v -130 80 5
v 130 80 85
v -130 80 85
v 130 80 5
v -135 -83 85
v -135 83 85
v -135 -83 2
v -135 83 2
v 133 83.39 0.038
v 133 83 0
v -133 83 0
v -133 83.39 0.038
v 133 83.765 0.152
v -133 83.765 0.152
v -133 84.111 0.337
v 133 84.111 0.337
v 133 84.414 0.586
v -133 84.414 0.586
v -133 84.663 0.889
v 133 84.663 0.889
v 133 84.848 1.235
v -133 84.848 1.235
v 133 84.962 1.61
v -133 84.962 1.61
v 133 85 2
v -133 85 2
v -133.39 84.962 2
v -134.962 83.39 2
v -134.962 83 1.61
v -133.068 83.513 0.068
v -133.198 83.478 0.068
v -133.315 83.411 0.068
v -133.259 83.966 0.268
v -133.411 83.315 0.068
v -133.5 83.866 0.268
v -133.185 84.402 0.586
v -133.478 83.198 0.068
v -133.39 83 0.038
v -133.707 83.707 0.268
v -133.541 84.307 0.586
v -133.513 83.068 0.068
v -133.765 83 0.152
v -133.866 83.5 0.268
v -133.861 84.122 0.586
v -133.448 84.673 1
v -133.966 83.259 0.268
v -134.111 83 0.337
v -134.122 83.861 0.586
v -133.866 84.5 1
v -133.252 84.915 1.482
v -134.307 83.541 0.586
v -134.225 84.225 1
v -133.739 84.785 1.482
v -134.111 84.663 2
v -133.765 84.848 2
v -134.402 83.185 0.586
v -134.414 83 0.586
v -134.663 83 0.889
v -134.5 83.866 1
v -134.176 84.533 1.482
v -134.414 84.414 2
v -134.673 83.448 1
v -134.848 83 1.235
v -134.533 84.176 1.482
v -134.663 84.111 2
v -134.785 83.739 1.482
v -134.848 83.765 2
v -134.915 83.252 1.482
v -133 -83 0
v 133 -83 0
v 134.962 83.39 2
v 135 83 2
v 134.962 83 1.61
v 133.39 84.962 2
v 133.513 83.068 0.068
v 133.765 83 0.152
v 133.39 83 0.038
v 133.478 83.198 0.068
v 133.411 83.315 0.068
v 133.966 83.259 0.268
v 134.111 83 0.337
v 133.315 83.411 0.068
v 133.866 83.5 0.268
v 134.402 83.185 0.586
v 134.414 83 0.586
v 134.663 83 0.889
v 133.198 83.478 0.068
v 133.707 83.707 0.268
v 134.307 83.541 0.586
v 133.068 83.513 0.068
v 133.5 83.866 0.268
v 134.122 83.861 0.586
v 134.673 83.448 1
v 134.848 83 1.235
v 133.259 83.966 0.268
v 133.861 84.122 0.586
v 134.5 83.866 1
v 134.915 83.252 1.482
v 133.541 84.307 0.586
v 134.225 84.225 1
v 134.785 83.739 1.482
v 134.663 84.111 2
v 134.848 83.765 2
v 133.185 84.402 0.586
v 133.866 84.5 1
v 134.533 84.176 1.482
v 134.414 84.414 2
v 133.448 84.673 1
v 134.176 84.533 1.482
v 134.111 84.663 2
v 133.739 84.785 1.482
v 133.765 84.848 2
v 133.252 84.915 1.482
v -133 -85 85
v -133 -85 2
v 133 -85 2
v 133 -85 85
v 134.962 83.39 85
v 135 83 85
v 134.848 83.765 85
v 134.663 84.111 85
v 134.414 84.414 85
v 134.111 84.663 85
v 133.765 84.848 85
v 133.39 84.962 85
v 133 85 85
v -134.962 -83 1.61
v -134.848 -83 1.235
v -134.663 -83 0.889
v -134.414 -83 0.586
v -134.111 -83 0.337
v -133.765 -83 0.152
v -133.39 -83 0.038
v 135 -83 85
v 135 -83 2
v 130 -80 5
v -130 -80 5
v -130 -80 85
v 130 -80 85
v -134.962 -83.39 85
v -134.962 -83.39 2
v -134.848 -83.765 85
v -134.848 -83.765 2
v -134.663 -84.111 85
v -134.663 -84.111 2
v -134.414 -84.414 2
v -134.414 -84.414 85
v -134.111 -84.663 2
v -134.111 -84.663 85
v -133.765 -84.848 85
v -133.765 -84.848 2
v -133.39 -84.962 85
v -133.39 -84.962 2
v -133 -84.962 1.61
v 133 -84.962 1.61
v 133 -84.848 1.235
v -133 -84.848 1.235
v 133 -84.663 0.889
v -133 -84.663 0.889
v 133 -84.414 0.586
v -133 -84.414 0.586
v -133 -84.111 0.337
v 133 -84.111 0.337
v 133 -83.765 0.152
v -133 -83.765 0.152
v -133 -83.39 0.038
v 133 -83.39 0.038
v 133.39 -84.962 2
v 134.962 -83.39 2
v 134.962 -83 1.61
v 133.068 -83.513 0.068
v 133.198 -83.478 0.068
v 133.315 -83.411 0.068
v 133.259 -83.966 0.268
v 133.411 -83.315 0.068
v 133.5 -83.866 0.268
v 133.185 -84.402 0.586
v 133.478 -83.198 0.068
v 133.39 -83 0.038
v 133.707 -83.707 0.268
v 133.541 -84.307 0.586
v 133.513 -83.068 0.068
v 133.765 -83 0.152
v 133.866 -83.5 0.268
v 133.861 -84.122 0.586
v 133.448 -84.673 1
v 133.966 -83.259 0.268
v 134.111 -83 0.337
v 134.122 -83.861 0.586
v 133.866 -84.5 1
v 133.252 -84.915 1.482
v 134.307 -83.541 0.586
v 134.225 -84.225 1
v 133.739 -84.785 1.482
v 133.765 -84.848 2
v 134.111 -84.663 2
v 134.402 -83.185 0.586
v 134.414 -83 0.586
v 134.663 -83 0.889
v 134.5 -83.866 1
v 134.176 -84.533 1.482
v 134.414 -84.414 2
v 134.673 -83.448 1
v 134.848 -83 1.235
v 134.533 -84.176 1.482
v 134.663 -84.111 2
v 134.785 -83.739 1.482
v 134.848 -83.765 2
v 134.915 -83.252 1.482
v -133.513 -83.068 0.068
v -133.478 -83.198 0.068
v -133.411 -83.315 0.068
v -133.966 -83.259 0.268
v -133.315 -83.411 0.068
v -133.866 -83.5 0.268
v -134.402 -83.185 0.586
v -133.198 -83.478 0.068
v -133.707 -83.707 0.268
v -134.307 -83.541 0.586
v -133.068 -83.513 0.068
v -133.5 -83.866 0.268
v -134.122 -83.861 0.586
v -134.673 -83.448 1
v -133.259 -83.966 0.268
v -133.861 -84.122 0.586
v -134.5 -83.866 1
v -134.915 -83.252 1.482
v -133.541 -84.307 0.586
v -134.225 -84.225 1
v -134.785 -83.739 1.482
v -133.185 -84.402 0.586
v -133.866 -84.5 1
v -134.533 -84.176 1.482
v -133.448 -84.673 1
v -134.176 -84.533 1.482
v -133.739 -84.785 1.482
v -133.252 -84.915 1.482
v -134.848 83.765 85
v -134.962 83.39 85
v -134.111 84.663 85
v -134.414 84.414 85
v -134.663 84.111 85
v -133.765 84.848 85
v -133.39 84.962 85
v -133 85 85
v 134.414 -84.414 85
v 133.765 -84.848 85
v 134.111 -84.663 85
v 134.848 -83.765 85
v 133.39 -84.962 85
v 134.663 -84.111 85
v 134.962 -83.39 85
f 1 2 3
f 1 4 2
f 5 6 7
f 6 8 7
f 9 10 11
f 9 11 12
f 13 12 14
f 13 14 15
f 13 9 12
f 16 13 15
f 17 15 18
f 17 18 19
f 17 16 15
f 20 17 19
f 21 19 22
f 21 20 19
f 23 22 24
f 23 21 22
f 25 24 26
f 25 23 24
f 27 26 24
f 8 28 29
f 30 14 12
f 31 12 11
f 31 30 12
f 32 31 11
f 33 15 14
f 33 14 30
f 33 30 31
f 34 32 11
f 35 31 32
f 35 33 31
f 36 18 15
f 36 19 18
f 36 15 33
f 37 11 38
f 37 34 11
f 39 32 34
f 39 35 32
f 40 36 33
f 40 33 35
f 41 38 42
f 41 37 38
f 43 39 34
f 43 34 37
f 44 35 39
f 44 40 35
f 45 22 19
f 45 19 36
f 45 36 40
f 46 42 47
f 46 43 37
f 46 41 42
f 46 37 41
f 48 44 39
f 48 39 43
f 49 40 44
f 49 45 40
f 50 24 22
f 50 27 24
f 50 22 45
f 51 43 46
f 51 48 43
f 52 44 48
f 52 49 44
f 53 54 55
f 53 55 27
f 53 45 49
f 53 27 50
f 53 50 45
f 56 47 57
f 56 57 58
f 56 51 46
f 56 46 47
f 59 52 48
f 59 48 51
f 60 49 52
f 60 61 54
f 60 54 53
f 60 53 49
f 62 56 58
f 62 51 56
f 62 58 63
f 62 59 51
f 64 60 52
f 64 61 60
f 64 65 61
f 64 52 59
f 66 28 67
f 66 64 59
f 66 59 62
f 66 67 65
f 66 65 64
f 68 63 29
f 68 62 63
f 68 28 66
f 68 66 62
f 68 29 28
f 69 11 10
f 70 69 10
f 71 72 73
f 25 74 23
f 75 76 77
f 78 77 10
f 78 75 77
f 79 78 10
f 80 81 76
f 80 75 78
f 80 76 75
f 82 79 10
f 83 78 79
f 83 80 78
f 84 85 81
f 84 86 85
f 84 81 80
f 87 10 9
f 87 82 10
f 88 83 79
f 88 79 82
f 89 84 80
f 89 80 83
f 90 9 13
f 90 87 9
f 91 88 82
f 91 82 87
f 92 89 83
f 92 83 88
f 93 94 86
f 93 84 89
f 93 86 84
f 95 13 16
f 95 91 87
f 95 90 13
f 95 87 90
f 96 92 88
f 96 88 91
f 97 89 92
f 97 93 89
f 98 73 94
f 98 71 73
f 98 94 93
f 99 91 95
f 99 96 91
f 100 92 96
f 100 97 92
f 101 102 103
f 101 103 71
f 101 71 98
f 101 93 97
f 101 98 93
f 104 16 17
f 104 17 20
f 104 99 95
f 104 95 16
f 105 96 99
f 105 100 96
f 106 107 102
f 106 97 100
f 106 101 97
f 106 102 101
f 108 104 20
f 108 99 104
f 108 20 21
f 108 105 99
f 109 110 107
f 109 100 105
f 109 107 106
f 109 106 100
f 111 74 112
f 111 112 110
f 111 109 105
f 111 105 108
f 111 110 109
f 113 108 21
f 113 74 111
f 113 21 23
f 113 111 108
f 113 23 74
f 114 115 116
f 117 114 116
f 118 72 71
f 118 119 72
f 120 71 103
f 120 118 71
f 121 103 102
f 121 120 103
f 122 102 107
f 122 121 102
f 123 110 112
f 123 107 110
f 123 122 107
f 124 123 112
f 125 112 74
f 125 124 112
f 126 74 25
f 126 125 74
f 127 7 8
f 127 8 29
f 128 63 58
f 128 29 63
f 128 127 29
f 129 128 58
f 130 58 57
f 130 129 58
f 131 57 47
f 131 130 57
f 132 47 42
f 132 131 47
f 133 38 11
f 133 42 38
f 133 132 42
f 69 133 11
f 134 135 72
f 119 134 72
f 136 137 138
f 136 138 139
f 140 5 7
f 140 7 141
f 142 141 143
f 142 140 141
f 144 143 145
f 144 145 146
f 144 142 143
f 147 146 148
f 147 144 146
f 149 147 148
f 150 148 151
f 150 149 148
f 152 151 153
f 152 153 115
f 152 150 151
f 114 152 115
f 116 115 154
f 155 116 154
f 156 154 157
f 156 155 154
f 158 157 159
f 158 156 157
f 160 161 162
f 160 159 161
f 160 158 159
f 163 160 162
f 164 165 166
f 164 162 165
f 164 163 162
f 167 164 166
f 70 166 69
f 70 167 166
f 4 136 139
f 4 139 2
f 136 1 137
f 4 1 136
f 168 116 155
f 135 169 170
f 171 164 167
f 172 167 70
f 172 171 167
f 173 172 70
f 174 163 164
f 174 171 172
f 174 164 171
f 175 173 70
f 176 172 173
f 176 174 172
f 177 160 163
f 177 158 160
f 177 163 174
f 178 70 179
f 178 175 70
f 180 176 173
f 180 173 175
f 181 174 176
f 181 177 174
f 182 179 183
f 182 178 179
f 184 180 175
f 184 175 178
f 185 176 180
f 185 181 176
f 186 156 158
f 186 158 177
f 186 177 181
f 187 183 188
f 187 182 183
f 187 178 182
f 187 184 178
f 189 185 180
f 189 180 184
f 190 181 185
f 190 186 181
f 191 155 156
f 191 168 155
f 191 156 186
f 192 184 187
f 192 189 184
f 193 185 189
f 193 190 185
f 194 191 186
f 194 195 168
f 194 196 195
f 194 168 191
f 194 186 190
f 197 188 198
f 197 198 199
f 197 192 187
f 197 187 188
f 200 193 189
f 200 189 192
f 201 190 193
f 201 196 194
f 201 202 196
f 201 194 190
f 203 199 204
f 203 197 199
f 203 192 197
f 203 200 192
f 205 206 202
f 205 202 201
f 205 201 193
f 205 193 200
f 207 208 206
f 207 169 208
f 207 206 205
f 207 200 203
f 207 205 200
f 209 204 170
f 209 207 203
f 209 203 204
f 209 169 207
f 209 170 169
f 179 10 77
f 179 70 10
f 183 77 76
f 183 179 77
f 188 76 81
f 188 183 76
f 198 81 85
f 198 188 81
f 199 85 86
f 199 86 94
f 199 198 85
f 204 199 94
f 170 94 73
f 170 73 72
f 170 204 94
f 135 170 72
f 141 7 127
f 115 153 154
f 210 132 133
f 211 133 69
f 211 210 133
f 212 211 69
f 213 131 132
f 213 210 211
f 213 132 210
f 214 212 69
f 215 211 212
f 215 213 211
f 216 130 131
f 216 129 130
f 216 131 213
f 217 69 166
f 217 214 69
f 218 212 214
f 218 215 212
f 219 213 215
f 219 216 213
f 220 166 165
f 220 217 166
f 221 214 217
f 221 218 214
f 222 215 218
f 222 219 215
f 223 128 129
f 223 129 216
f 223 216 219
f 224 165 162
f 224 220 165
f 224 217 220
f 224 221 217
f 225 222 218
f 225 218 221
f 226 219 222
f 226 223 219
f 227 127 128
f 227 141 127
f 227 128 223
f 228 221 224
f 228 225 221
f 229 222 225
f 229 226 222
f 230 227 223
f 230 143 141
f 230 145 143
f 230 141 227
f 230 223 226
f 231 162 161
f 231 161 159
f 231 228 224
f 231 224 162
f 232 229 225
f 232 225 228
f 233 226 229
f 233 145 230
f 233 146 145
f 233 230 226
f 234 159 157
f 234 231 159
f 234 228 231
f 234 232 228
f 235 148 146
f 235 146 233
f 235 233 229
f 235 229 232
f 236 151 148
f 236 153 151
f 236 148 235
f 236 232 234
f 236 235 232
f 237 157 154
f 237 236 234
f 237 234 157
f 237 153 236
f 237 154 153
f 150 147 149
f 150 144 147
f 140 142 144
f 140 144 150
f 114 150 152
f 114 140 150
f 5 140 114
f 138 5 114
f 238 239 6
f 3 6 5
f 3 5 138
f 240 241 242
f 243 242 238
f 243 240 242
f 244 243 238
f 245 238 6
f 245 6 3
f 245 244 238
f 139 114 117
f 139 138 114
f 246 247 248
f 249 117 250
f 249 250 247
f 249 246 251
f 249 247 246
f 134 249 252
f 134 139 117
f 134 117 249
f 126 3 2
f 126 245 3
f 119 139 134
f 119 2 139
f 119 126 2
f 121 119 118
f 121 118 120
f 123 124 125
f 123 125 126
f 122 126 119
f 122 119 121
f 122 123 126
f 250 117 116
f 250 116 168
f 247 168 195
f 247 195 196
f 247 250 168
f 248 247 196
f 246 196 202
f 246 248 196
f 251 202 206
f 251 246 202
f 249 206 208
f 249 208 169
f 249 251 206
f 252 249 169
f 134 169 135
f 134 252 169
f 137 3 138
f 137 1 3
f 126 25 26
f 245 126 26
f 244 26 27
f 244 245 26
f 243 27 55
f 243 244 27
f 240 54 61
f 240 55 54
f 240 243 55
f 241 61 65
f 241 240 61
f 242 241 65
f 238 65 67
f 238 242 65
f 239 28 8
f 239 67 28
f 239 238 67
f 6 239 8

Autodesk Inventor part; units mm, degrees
ref_plane "YZ Plane" through (0, 0, 0) normal (1, 0, 0) x (0, 1, 0)
ref_plane "XZ Plane" through (0, 0, 0) normal (0, 1, 0) x (-1, 0, 0)
ref_plane "XY Plane" through (0, 0, 0) normal (0, 0, 1) x (1, 0, 0)
sketch "Sketch3" plane through (0, 0, 0) normal (0, 0, 1) x (1, 0, 0)
  line L0 (0, -119) -> (0, 119) projected
  line L1 (-189, 0) -> (189, 0) projected
  line L2 (-135, -85) -> (135, -85)
  line L3 (135, -85) -> (135, 85)
  line L4 (135, 85) -> (-135, 85)
  line L5 (-135, 85) -> (-135, -85)
  line L6 (-135, -85) -> (135, 85) construction
  line L7 (135, -85) -> (-135, 85) construction
  line L8 (-130, -80) -> (130, -80)
  line L9 (130, -80) -> (130, 80)
  line L10 (130, 80) -> (-130, 80)
  line L11 (-130, 80) -> (-130, -80)
  line L12 (-130, -80) -> (130, 80) construction
  line L13 (130, -80) -> (-130, 80) construction
  point P0 (0, 0)
  dimension "d0" = 270
  dimension "d1" = 170
  dimension "d2" = 260
  dimension "d3" = 160
extrude "Extrusion1" add sketch "Sketch3" along normal blind 85 contours L2 L5 L1 L11 L8 L0 | L0 L8 L9 L1 L3 L2 | L5 L4 L0 L10 L11 L1 | L1 L9 L10 L0 L4 L3
extrude "Extrusion2" add sketch "Sketch3" along normal blind 5 contours L8 L11 L1 L0 | L0 L1 L9 L8 | L1 L11 L10 L0 | L0 L10 L9 L1
fillet "Fillet1" radius 2 8 edges at (135, -85, 42.5) (135, 85, 42.5) (-135, 85, 42.5) (-135, -85, 42.5) (-135, 0, 0) (0, 85, 0) (0, -85, 0) (135, 0, 0)
equation "\"BendRadius\" = Thickness"
equation "\"BendReliefWidth\" = Thickness"
equation "\"BendReliefDepth\" = 0.5 * Thickness"
equation "\"CornerReliefSize\" = 4 * Thickness"
equation "\"MinimumRemnant\" = 2 * Thickness"
equation "\"TransitionRadius\" = BendRadius"
equation "\"JacobiRadiusSize\" = BendRadius"
equation "\"GapSize\" = Thickness"
equation "\"Thickness\" = 0.5"
properties part number "Batterybox"
